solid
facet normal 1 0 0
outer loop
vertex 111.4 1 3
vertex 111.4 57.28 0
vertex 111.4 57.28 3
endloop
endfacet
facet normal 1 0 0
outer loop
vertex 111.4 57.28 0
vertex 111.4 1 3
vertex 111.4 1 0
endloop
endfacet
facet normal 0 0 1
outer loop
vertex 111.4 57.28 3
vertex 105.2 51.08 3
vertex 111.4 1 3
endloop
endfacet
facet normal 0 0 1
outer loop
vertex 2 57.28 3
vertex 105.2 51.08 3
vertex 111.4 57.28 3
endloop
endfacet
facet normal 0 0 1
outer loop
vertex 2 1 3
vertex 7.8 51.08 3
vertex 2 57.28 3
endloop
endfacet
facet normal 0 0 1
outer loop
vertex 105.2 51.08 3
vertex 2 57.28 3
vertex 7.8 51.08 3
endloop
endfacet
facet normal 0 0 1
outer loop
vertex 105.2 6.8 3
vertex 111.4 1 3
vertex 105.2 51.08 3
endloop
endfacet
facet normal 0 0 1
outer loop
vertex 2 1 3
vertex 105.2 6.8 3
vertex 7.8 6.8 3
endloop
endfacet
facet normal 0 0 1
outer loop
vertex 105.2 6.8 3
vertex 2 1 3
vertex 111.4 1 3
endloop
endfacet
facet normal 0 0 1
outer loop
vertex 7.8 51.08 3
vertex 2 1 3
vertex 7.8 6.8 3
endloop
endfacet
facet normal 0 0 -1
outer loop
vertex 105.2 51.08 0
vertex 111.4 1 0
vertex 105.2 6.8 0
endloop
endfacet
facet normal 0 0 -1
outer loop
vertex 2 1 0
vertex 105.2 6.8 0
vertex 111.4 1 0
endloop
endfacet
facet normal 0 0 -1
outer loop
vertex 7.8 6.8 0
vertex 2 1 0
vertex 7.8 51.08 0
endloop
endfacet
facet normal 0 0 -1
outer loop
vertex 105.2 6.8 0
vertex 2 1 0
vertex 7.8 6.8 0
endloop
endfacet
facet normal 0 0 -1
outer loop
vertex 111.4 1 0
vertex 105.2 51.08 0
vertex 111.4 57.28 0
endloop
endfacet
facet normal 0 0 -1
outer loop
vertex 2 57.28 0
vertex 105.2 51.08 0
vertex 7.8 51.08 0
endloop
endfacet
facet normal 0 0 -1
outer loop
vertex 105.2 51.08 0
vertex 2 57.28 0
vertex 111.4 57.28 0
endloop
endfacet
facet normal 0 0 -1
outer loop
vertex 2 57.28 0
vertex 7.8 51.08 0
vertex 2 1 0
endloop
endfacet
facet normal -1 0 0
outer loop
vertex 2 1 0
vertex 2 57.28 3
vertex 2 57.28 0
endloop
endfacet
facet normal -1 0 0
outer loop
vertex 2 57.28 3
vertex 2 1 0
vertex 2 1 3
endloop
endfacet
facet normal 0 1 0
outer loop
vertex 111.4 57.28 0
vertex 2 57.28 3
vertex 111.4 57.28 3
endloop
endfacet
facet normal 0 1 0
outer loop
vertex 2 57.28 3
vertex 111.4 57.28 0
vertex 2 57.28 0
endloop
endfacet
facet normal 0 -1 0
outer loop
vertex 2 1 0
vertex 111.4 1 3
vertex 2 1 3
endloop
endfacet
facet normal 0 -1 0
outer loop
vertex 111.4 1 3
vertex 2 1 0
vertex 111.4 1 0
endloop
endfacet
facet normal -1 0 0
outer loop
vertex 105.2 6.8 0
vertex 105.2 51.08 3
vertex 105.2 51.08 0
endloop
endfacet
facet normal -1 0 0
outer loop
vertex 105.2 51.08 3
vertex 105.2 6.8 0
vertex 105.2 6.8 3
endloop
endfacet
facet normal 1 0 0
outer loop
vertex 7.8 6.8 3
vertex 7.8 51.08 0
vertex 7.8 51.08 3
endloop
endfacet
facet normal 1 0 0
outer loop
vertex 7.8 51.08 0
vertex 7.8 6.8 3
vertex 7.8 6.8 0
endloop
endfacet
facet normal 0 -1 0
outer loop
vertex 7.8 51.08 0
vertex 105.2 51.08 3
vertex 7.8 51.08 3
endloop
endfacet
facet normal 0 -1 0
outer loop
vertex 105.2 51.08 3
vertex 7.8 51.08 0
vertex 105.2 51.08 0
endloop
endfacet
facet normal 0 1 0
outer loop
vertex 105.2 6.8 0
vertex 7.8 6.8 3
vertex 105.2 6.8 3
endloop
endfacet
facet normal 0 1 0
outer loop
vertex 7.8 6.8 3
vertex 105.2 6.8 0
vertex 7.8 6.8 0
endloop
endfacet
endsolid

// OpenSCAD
//parametros
lMin = 58;
lMax = 64.88; //63
comp = 117;
altura = 2;
bordaL = 15;

//makePrincipal();
makeTopo();
//makeTela();
//makeTelaFechada();


// --------------------------------------------
module makePrincipal(addEncaixe = true) {
    difference() {
    union() {
        orelha();
        
        body();
        if (addEncaixe == true) addEncaixe();

        color("blue")
        translate([6,5,1])
        honeycomb(comp-bordaL, lMax-bordaL, altura, 2, 0.8); 
    }

    bodyCorte();
    }
}

module makeTopo() {
    //color("black")
    //translate([0,0,2])
    bodyTopo();
}

module makeTela() {
    makePrincipal(false);
}

module makeTelaFechada() {
    bodyExterno();
}


module orelha() {
translate([comp-5,(lMin/2),0])
difference() {
    cylinder(h=altura, r=20/2, $fn=60);
    
    translate([-30,-15,-1])
    cube([30,30,5]);
}
}

module addEncaixe() {
iMax = lMax - bordaL - (4+2);
icomp = comp - bordaL - 5;

union() {
    difference() {

    color("red")
    translate([bordaL-(9-2),bordaL-(10-2),0])
    cube([icomp,iMax,15]);

    color("blue")
    translate([bordaL-(9-4),bordaL-(10-4),-2])
    cube([icomp - 4,iMax - 4,19]);

    }
    
//traves
translate([bordaL+25,bordaL-(10-2),0])
cube([0.8,iMax,15]);

translate([bordaL+60,bordaL-(10-2),0])
cube([0.8,iMax,15]);

translate([bordaL-7,(lMin/2),0])
cube([icomp,0.8,15]);
}
    
}


module bodyTopo() {
iMax = lMax - bordaL - (4+2) + 2.4;
icomp = comp - bordaL - 5 + 2.4;

difference() {

color("red")
translate([bordaL-13,bordaL-14,0])
cube([icomp+10,iMax+10,3]);

color("blue")
translate([bordaL-7.2,bordaL-8.2,-2])
cube([icomp-2,iMax-2,6]);

}
    
}

module bodyCorte() {
    brd = 5;
    dDif = 2;
    eDif = 11.9;
    
    translate([0,0,-1])
    rotate([0,-1,0]) {
        translate([-2,-dDif,2])
        cube([lMax+2,brd+dDif,altura*2]);

        translate([-2,lMax-eDif,2])
        cube([lMax+2,brd+dDif,altura*2]);
    }
}

module body() {
    difference() {
        bodyExterno();
        bodyInterno();
    }
}

module bodyExterno() {
    linear_extrude(height=altura, center=false, convexity=10)
    polygon_body();
}

module bodyInterno() {
    iMax = lMax - bordaL - (4+2);
    icomp = comp - bordaL - 5;

    translate([bordaL-(9-2),bordaL-(10-2),-1])
    cube([icomp,iMax,altura*2]);
}

module cruzado() {
    color("red")
    cube([5,comp,altura]);
}

module polygon_body(diferenca = 0) {
    diferenca = diferenca * 2;
    lMin = (lMin - diferenca);
    lMax = (lMax - diferenca);
    comp = 117 - (diferenca * 1.2);
    lDif = (lMax - lMin) / 2;

    polygon([[0,0],[comp,-lDif],[comp,lMin+lDif],[0,lMin]]);
}






module hc_column(length, cell_size, wall_thickness) {
        no_of_cells = floor(length / (cell_size + wall_thickness)) ;

        for (i = [0 : no_of_cells]) {
                translate([0,(i * (cell_size + wall_thickness)),0])
                         circle($fn = 6, r = cell_size * (sqrt(3)/3));
        }
}

module honeycomb (length, width, height, cell_size, wall_thickness) {
        no_of_rows = floor(1.2 * length / (cell_size +
wall_thickness)) ;

        tr_mod = cell_size + wall_thickness;
        tr_x = sqrt(3)/2 * tr_mod;
        tr_y = tr_mod / 2;
        off_x = -1 * wall_thickness / 2;
        off_y = wall_thickness / 2;
        linear_extrude(height = height, center = true, convexity = 10,
twist = 0, slices = 1)
                difference(){
                        square([length, width]);
                        for (i = [0 : no_of_rows]) {
                                translate([i * tr_x + off_x, (i % 2) *
tr_y + off_y,0])
                                        hc_column(width, cell_size,
wall_thickness);
                        }
                }
}
